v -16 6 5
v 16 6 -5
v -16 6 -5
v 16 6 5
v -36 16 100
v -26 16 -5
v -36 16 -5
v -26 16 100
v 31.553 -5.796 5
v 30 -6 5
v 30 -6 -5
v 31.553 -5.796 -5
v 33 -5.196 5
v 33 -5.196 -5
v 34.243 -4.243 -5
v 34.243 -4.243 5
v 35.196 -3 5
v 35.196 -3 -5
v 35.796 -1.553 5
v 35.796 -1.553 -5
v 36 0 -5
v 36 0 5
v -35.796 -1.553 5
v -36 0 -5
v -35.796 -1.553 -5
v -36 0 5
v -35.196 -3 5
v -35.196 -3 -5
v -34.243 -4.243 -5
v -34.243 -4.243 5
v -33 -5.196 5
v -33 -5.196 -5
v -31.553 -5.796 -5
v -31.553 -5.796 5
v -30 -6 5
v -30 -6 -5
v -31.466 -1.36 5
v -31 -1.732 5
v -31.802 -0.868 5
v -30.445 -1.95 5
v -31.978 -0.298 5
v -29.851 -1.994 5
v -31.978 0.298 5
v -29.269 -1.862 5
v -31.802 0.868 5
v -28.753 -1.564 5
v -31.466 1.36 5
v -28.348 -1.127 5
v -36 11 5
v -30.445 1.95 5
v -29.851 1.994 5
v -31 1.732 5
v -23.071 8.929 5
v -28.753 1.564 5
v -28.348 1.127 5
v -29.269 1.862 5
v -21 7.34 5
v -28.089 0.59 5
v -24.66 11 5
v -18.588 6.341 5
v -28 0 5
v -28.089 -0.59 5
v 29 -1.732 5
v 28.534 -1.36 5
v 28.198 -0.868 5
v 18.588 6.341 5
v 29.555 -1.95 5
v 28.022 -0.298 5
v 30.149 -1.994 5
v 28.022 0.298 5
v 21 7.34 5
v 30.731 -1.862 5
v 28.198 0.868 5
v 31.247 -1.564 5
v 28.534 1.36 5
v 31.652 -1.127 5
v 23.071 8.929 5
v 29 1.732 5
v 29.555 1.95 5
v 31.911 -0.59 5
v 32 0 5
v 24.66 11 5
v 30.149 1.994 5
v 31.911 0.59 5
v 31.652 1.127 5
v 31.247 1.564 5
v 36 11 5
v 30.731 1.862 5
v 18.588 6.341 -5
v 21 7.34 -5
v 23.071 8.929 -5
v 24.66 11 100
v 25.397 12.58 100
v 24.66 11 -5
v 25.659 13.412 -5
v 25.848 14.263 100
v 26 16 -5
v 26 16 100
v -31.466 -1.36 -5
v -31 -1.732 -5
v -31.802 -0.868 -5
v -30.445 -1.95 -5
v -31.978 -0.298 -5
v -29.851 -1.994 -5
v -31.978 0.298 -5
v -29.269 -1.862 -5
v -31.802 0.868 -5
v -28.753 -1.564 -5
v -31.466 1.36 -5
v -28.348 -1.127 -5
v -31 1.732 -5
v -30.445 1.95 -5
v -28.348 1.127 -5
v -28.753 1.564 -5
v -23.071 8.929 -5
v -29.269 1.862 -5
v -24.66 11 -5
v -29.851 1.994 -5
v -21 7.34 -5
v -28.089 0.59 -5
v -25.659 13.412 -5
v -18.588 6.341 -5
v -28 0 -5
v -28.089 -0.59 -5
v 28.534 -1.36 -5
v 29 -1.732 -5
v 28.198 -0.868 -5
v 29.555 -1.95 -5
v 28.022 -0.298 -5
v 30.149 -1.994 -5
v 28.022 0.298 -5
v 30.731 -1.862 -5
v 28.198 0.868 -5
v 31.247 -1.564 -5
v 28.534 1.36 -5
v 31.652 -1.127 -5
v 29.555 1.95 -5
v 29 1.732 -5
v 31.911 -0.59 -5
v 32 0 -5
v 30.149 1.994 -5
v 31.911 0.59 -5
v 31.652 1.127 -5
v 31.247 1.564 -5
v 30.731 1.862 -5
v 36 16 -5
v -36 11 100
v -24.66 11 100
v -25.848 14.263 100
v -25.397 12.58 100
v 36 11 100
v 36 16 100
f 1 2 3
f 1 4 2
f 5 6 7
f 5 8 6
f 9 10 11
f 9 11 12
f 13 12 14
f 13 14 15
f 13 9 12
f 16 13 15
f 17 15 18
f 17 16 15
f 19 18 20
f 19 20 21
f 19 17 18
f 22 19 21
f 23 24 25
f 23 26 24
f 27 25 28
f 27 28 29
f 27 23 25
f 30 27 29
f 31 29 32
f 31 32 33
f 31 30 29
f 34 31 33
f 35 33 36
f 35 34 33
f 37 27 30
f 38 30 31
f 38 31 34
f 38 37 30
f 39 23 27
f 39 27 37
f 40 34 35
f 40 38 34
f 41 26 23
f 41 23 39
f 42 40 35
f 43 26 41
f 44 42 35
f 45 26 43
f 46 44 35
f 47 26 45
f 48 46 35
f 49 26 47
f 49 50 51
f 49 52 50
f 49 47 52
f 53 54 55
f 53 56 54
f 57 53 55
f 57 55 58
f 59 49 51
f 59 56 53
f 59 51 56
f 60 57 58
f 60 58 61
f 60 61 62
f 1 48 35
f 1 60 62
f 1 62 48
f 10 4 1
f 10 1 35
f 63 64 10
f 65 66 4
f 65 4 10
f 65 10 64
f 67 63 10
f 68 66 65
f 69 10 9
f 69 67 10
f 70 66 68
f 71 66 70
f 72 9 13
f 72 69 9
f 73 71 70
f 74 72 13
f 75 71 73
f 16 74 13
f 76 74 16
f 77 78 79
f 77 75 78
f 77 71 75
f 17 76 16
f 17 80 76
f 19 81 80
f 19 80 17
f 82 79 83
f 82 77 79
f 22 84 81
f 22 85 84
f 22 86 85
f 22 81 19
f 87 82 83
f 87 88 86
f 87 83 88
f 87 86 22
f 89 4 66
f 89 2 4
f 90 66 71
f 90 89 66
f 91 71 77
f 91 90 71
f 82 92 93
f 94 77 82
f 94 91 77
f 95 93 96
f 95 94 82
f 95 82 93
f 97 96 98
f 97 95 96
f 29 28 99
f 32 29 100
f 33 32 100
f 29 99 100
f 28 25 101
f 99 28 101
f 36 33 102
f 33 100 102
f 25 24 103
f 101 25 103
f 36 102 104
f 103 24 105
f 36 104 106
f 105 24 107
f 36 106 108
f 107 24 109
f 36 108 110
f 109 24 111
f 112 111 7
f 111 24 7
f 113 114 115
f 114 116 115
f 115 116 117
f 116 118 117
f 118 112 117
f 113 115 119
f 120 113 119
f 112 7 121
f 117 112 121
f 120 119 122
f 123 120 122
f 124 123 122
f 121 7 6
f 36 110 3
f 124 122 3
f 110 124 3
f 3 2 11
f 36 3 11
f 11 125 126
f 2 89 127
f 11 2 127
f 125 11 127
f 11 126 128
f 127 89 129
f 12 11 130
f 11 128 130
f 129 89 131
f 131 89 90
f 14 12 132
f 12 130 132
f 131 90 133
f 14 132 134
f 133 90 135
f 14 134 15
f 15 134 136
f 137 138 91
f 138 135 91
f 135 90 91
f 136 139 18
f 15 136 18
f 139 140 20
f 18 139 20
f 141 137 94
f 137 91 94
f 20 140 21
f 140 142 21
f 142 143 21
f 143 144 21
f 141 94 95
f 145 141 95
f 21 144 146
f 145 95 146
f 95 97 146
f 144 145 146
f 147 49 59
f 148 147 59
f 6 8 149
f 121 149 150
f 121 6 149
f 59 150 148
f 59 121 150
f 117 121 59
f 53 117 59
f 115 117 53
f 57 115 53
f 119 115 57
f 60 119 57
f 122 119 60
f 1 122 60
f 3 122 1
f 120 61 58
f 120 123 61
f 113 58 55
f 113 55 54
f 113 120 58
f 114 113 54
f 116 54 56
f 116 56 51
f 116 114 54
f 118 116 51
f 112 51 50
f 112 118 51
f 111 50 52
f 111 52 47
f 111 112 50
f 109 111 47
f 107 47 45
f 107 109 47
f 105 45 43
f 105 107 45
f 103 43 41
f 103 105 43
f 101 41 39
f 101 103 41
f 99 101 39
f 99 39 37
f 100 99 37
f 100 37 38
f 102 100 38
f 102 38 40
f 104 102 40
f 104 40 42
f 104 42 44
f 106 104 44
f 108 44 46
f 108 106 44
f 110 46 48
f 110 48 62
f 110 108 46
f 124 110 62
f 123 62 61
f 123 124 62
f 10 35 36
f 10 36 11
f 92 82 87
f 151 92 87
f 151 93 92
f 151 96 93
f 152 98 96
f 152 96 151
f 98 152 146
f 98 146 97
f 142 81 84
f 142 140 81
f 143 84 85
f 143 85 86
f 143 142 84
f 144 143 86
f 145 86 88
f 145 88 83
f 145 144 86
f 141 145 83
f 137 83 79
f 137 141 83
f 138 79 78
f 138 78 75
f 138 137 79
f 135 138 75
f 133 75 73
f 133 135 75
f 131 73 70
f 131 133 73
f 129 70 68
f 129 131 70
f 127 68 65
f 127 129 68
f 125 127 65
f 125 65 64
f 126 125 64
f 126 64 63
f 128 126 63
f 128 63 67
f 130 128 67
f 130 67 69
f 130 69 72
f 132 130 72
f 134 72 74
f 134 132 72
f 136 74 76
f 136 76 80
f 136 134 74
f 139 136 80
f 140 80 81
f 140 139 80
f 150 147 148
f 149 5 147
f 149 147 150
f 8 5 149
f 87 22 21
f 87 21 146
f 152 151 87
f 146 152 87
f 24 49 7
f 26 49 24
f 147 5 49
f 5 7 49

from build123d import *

# Parameters (mm, degrees)
SKETCH1_R           = 2
BOSS_EXTRUDE1_DEPTH = 5
SKETCH1_3_W         = 10
SKETCH1_3_H         = 5
BOSS_EXTRUDE2_DEPTH = 100
FILLET1_R           = 10


with BuildPart() as part:
    # Sketch1 → Boss-Extrude1 (new, symmetric)
    with BuildSketch(Plane.XY):
        with BuildLine():
            ThreePointArc((-36, 0), (-34.242640687, -4.242640687), (-30, -6))
            Line((-30, -6), (30, -6))
            ThreePointArc((30, -6), (34.242640687, -4.242640687), (36, 0))
            Line((36, 0), (36, 16))
            Line((36, 16), (26, 16))
            Line((26, 16), (26, 6))
            Line((26, 6), (-26, 6))
            Line((-26, 6), (-26, 16))
            Line((-26, 16), (-36, 16))
            Line((-36, 16), (-36, 0))
        make_face()
        with Locations((-30, 0)):
            Circle(SKETCH1_R, mode=Mode.SUBTRACT)
        with Locations((30, 0)):
            Circle(SKETCH1_R, mode=Mode.SUBTRACT)
    extrude(amount=BOSS_EXTRUDE1_DEPTH, both=True)

    # Sketch1<3> → Boss-Extrude2 (add)
    with BuildSketch(Plane.XY):
        with Locations((-31, 13.5)):
            Rectangle(SKETCH1_3_W, SKETCH1_3_H)
        with Locations((31, 13.5)):
            Rectangle(SKETCH1_3_W, SKETCH1_3_H)
    extrude(amount=BOSS_EXTRUDE2_DEPTH)

    # Fillet1
    fillet1_edges = [part.edges().sort_by_distance(p)[0] for p in [
        (26, 6, 0),
        (-26, 6, 0),
    ]]
    fillet(fillet1_edges, radius=FILLET1_R - 0.0001)  # a hair under: the kernel refuses the full size


solid = part.part
